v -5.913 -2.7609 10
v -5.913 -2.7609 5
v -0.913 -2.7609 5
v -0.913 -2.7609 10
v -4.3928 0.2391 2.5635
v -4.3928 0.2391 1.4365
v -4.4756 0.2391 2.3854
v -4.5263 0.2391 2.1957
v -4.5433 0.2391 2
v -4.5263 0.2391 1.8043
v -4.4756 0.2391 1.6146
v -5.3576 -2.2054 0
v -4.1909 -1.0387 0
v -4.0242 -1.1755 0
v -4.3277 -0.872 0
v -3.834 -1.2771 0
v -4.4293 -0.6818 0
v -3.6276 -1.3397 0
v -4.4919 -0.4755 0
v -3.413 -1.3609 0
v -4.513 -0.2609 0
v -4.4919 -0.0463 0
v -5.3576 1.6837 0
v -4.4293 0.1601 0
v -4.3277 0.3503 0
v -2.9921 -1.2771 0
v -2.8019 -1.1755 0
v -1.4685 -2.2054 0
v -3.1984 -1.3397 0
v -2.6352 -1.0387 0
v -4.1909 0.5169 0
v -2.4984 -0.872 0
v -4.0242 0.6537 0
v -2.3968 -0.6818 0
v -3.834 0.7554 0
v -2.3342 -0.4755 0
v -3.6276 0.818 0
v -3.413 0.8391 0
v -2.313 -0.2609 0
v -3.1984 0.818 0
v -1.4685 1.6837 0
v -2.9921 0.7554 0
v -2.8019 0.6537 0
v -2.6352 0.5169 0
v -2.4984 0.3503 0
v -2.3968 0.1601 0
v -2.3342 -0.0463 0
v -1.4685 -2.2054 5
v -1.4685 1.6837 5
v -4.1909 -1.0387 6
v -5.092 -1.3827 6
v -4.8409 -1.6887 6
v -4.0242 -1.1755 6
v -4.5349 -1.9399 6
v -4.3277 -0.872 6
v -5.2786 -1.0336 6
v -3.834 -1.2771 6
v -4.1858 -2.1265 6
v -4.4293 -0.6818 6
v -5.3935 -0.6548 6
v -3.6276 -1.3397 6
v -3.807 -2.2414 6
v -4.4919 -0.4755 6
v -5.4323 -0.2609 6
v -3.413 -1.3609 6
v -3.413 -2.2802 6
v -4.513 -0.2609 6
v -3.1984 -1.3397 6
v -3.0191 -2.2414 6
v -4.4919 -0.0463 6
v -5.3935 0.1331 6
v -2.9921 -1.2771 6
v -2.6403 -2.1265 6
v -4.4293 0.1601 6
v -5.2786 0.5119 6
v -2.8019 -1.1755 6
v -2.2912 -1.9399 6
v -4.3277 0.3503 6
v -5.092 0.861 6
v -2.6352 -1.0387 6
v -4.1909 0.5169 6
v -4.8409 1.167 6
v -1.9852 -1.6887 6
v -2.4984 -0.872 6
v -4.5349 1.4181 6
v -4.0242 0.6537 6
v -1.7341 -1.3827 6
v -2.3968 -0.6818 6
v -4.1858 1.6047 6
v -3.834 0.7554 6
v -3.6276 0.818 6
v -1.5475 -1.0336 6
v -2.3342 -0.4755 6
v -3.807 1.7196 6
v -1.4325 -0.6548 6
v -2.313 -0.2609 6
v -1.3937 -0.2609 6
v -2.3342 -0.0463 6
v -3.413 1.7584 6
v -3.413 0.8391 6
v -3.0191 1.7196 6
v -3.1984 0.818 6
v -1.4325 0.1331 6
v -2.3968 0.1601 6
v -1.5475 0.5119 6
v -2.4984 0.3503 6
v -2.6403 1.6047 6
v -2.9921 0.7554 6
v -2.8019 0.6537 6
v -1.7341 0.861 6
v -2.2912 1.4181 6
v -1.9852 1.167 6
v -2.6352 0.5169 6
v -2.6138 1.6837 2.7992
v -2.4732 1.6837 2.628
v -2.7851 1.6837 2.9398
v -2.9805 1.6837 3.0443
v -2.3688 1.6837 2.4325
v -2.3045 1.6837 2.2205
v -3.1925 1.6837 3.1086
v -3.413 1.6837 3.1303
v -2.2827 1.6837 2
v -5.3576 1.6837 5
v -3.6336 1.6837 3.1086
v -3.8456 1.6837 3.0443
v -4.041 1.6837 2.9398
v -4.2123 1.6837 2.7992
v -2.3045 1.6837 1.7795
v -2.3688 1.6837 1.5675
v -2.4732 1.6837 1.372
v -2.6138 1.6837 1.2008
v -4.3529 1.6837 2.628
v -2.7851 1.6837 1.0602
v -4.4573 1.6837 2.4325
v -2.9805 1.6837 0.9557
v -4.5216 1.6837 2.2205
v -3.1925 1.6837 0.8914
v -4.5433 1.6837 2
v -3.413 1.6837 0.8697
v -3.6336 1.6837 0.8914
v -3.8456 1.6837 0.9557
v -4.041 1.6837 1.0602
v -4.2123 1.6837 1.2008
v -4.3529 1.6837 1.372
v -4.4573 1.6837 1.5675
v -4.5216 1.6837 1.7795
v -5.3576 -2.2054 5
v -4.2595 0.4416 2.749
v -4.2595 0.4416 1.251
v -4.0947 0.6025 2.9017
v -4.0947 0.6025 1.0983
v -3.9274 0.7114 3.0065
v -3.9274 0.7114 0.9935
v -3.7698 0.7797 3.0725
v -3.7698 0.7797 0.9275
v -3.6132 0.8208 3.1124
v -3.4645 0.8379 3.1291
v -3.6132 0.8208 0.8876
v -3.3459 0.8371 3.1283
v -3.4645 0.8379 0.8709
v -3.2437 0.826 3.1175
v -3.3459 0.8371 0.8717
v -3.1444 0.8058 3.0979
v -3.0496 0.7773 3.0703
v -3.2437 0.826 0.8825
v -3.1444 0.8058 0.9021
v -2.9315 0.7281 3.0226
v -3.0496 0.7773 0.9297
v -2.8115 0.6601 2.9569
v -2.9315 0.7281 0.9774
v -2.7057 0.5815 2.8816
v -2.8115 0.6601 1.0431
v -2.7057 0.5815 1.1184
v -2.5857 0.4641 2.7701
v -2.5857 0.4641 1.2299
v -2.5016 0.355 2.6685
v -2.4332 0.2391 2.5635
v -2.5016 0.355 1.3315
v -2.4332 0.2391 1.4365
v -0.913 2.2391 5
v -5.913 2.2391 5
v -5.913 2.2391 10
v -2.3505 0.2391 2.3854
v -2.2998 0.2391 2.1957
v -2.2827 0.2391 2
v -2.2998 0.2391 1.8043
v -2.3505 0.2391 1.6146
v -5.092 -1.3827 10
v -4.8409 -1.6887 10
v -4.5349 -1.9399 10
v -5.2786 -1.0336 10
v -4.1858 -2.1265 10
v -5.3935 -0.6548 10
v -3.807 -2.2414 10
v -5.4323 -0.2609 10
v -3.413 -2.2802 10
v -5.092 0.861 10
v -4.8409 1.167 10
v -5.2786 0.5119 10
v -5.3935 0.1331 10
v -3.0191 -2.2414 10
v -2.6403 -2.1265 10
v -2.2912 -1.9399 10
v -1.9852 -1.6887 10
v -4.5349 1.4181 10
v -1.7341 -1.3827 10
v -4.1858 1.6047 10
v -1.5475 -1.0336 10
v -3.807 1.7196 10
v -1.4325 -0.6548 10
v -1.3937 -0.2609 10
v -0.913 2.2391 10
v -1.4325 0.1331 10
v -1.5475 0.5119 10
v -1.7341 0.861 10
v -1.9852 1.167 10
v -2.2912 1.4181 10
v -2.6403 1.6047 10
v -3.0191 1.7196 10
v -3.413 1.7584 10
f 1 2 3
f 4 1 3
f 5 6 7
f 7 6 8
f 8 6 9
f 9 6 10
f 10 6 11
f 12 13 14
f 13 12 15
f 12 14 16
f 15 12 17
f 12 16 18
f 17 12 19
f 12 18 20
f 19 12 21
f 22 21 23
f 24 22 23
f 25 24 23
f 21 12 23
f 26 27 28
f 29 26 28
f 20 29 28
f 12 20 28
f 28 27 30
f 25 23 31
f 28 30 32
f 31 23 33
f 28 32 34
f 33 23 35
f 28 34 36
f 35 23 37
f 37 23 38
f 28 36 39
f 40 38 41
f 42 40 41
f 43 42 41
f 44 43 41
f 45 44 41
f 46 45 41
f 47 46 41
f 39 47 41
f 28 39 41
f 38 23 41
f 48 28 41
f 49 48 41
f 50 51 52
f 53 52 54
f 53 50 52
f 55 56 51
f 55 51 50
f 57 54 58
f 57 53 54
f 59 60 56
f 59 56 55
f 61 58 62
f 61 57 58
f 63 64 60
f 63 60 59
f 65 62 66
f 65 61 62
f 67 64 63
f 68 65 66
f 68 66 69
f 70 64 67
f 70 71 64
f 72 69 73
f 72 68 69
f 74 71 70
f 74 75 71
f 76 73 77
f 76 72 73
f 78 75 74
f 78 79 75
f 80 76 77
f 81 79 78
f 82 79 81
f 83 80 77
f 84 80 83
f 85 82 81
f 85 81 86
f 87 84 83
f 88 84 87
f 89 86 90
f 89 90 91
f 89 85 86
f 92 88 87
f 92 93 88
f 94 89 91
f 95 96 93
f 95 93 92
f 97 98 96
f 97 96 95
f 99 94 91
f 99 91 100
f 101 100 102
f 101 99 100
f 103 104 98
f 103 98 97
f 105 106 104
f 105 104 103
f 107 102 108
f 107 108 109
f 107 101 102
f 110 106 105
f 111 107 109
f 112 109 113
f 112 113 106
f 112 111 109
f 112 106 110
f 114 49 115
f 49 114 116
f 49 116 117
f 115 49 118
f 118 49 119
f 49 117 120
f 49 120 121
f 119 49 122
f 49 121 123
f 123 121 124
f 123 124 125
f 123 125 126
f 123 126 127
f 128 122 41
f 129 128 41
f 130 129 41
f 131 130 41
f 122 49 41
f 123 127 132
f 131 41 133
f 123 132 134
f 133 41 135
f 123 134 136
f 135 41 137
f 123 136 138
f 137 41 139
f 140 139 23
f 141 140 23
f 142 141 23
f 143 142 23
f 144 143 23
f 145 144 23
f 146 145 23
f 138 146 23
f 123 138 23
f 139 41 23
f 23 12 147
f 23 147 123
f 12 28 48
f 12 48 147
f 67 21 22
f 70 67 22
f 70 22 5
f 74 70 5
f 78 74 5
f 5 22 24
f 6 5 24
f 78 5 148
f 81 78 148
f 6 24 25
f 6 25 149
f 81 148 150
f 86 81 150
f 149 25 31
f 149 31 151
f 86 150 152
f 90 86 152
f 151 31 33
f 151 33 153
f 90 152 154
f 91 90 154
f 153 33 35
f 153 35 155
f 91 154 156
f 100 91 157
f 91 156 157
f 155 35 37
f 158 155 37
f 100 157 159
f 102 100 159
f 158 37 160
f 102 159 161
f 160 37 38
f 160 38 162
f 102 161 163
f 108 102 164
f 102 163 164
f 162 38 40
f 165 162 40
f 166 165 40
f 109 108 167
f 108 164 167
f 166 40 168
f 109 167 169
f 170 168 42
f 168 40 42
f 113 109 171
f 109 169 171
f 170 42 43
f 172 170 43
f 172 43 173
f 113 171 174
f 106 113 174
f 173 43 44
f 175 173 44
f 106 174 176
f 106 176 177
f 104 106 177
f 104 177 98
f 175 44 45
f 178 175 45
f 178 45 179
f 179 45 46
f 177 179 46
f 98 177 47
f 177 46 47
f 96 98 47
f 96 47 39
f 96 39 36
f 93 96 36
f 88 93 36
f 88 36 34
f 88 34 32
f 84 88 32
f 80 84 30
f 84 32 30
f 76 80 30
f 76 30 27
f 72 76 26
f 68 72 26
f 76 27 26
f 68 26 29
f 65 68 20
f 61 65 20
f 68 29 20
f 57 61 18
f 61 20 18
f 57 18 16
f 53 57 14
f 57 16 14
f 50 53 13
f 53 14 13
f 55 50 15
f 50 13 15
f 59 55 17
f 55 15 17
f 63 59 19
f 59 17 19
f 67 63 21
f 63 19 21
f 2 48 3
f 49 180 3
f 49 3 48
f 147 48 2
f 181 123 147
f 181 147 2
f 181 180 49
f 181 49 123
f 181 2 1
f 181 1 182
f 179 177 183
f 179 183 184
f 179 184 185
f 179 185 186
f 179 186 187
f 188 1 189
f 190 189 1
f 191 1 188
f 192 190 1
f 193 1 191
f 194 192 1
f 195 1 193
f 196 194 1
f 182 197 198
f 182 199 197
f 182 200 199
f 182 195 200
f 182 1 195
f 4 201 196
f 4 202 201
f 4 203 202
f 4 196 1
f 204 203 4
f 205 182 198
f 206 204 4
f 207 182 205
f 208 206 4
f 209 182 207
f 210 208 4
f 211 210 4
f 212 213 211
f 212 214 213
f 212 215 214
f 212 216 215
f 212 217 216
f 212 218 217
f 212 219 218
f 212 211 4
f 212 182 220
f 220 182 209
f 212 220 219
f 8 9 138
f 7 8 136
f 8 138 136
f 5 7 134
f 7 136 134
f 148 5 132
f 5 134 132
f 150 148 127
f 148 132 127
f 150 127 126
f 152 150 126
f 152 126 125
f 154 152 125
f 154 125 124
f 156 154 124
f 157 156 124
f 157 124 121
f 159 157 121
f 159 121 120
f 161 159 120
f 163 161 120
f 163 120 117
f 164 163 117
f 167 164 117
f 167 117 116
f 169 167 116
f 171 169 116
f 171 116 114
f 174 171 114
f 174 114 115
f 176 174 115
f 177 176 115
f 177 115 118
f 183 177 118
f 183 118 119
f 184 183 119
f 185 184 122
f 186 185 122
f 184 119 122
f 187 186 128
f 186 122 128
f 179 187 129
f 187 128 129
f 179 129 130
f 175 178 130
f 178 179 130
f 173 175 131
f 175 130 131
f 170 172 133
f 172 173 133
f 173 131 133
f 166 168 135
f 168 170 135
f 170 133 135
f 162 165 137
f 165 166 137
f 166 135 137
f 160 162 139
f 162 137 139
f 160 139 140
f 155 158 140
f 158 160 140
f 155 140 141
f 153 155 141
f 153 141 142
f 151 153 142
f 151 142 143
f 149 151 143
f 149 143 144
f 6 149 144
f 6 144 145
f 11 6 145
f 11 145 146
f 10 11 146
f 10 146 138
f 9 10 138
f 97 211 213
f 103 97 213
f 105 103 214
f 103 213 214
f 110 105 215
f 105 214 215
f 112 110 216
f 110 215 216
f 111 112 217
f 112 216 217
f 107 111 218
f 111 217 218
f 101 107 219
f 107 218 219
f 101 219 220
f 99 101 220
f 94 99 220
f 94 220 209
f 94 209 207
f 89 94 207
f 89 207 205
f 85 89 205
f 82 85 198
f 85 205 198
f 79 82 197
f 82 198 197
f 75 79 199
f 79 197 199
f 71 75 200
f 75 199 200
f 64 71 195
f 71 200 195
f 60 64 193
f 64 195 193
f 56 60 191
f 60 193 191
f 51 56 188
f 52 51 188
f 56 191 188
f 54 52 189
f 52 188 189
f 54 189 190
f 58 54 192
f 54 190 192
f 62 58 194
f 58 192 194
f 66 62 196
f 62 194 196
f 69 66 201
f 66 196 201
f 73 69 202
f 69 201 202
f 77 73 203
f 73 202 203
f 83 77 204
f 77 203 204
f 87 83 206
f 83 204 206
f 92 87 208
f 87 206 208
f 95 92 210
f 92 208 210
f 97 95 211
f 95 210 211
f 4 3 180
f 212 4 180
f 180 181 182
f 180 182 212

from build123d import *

# Parameters (mm, degrees)
SKETCH1_W                     = 5
SKETCH1_H                     = 5
BOSS_EXTRUDE1_DEPTH           = 10
HOLE_FOR_TUBING_R             = 1.1
CUT_EXTRUDE1_DEPTH            = 12.94095825
F_10_32_HOLE_FOR_LUER_SCREW_R = 2.0193
CUT_EXTRUDE2_DEPTH            = 4
F_4_40_SET_SCREW_HOLE_R       = 1.1303
CUT_EXTRUDE3_DEPTH            = 2
SKETCH2_W                     = 7.037684522
SKETCH2_H                     = 8.186757887
SKETCH2_W_2                   = 3.889087297
SKETCH2_H_2                   = 3.889087296
CUT_EXTRUDE4_DEPTH            = 5


with BuildPart() as part:
    # Sketch1 → Boss-Extrude1 (new body)
    with BuildSketch(Plane.XY):
        with Locations((-3.413043478, -0.260869565)):
            Rectangle(SKETCH1_W, SKETCH1_H)
    extrude(amount=BOSS_EXTRUDE1_DEPTH)

    # hole for tubing → Cut-Extrude1 (cut, through all)
    with BuildSketch(Plane(origin=(0, 0, 0), x_dir=(-1, 0, 0), z_dir=(0, 0, -1))):
        with Locations((3.413043478, -0.260869565)):
            Circle(HOLE_FOR_TUBING_R)
    extrude(amount=-CUT_EXTRUDE1_DEPTH, mode=Mode.SUBTRACT)

    # 10-32 hole for luer screw → Cut-Extrude2 (cut)
    with BuildSketch(Plane.XY.offset(10)):
        with Locations((-3.413043478, -0.260869565)):
            Circle(F_10_32_HOLE_FOR_LUER_SCREW_R)
    extrude(amount=-CUT_EXTRUDE2_DEPTH, mode=Mode.SUBTRACT)

    # 4-40 set screw hole → Cut-Extrude3 (cut)
    with BuildSketch(Plane(origin=(0, 2.239130435, 0), x_dir=(1, 0, 0), z_dir=(0, 1, 0))):
        with Locations(Location((-3.413043478, -2, 0), (0, 0, 180))):
            Circle(F_4_40_SET_SCREW_HOLE_R)
    extrude(amount=-CUT_EXTRUDE3_DEPTH, mode=Mode.SUBTRACT)

    # Sketch2 → Cut-Extrude4 (cut)
    with BuildSketch(Plane(origin=(0, 0, 0), x_dir=(-1, 0, 0), z_dir=(0, 0, -1))):
        with Locations((3.518842261, 0.133851948)):
            Rectangle(SKETCH2_W, SKETCH2_H)
        with Locations((3.413043479, -0.260869565)):
            Rectangle(SKETCH2_W_2, SKETCH2_H_2, mode=Mode.SUBTRACT)
    extrude(amount=-CUT_EXTRUDE4_DEPTH, mode=Mode.SUBTRACT)


solid = part.part
